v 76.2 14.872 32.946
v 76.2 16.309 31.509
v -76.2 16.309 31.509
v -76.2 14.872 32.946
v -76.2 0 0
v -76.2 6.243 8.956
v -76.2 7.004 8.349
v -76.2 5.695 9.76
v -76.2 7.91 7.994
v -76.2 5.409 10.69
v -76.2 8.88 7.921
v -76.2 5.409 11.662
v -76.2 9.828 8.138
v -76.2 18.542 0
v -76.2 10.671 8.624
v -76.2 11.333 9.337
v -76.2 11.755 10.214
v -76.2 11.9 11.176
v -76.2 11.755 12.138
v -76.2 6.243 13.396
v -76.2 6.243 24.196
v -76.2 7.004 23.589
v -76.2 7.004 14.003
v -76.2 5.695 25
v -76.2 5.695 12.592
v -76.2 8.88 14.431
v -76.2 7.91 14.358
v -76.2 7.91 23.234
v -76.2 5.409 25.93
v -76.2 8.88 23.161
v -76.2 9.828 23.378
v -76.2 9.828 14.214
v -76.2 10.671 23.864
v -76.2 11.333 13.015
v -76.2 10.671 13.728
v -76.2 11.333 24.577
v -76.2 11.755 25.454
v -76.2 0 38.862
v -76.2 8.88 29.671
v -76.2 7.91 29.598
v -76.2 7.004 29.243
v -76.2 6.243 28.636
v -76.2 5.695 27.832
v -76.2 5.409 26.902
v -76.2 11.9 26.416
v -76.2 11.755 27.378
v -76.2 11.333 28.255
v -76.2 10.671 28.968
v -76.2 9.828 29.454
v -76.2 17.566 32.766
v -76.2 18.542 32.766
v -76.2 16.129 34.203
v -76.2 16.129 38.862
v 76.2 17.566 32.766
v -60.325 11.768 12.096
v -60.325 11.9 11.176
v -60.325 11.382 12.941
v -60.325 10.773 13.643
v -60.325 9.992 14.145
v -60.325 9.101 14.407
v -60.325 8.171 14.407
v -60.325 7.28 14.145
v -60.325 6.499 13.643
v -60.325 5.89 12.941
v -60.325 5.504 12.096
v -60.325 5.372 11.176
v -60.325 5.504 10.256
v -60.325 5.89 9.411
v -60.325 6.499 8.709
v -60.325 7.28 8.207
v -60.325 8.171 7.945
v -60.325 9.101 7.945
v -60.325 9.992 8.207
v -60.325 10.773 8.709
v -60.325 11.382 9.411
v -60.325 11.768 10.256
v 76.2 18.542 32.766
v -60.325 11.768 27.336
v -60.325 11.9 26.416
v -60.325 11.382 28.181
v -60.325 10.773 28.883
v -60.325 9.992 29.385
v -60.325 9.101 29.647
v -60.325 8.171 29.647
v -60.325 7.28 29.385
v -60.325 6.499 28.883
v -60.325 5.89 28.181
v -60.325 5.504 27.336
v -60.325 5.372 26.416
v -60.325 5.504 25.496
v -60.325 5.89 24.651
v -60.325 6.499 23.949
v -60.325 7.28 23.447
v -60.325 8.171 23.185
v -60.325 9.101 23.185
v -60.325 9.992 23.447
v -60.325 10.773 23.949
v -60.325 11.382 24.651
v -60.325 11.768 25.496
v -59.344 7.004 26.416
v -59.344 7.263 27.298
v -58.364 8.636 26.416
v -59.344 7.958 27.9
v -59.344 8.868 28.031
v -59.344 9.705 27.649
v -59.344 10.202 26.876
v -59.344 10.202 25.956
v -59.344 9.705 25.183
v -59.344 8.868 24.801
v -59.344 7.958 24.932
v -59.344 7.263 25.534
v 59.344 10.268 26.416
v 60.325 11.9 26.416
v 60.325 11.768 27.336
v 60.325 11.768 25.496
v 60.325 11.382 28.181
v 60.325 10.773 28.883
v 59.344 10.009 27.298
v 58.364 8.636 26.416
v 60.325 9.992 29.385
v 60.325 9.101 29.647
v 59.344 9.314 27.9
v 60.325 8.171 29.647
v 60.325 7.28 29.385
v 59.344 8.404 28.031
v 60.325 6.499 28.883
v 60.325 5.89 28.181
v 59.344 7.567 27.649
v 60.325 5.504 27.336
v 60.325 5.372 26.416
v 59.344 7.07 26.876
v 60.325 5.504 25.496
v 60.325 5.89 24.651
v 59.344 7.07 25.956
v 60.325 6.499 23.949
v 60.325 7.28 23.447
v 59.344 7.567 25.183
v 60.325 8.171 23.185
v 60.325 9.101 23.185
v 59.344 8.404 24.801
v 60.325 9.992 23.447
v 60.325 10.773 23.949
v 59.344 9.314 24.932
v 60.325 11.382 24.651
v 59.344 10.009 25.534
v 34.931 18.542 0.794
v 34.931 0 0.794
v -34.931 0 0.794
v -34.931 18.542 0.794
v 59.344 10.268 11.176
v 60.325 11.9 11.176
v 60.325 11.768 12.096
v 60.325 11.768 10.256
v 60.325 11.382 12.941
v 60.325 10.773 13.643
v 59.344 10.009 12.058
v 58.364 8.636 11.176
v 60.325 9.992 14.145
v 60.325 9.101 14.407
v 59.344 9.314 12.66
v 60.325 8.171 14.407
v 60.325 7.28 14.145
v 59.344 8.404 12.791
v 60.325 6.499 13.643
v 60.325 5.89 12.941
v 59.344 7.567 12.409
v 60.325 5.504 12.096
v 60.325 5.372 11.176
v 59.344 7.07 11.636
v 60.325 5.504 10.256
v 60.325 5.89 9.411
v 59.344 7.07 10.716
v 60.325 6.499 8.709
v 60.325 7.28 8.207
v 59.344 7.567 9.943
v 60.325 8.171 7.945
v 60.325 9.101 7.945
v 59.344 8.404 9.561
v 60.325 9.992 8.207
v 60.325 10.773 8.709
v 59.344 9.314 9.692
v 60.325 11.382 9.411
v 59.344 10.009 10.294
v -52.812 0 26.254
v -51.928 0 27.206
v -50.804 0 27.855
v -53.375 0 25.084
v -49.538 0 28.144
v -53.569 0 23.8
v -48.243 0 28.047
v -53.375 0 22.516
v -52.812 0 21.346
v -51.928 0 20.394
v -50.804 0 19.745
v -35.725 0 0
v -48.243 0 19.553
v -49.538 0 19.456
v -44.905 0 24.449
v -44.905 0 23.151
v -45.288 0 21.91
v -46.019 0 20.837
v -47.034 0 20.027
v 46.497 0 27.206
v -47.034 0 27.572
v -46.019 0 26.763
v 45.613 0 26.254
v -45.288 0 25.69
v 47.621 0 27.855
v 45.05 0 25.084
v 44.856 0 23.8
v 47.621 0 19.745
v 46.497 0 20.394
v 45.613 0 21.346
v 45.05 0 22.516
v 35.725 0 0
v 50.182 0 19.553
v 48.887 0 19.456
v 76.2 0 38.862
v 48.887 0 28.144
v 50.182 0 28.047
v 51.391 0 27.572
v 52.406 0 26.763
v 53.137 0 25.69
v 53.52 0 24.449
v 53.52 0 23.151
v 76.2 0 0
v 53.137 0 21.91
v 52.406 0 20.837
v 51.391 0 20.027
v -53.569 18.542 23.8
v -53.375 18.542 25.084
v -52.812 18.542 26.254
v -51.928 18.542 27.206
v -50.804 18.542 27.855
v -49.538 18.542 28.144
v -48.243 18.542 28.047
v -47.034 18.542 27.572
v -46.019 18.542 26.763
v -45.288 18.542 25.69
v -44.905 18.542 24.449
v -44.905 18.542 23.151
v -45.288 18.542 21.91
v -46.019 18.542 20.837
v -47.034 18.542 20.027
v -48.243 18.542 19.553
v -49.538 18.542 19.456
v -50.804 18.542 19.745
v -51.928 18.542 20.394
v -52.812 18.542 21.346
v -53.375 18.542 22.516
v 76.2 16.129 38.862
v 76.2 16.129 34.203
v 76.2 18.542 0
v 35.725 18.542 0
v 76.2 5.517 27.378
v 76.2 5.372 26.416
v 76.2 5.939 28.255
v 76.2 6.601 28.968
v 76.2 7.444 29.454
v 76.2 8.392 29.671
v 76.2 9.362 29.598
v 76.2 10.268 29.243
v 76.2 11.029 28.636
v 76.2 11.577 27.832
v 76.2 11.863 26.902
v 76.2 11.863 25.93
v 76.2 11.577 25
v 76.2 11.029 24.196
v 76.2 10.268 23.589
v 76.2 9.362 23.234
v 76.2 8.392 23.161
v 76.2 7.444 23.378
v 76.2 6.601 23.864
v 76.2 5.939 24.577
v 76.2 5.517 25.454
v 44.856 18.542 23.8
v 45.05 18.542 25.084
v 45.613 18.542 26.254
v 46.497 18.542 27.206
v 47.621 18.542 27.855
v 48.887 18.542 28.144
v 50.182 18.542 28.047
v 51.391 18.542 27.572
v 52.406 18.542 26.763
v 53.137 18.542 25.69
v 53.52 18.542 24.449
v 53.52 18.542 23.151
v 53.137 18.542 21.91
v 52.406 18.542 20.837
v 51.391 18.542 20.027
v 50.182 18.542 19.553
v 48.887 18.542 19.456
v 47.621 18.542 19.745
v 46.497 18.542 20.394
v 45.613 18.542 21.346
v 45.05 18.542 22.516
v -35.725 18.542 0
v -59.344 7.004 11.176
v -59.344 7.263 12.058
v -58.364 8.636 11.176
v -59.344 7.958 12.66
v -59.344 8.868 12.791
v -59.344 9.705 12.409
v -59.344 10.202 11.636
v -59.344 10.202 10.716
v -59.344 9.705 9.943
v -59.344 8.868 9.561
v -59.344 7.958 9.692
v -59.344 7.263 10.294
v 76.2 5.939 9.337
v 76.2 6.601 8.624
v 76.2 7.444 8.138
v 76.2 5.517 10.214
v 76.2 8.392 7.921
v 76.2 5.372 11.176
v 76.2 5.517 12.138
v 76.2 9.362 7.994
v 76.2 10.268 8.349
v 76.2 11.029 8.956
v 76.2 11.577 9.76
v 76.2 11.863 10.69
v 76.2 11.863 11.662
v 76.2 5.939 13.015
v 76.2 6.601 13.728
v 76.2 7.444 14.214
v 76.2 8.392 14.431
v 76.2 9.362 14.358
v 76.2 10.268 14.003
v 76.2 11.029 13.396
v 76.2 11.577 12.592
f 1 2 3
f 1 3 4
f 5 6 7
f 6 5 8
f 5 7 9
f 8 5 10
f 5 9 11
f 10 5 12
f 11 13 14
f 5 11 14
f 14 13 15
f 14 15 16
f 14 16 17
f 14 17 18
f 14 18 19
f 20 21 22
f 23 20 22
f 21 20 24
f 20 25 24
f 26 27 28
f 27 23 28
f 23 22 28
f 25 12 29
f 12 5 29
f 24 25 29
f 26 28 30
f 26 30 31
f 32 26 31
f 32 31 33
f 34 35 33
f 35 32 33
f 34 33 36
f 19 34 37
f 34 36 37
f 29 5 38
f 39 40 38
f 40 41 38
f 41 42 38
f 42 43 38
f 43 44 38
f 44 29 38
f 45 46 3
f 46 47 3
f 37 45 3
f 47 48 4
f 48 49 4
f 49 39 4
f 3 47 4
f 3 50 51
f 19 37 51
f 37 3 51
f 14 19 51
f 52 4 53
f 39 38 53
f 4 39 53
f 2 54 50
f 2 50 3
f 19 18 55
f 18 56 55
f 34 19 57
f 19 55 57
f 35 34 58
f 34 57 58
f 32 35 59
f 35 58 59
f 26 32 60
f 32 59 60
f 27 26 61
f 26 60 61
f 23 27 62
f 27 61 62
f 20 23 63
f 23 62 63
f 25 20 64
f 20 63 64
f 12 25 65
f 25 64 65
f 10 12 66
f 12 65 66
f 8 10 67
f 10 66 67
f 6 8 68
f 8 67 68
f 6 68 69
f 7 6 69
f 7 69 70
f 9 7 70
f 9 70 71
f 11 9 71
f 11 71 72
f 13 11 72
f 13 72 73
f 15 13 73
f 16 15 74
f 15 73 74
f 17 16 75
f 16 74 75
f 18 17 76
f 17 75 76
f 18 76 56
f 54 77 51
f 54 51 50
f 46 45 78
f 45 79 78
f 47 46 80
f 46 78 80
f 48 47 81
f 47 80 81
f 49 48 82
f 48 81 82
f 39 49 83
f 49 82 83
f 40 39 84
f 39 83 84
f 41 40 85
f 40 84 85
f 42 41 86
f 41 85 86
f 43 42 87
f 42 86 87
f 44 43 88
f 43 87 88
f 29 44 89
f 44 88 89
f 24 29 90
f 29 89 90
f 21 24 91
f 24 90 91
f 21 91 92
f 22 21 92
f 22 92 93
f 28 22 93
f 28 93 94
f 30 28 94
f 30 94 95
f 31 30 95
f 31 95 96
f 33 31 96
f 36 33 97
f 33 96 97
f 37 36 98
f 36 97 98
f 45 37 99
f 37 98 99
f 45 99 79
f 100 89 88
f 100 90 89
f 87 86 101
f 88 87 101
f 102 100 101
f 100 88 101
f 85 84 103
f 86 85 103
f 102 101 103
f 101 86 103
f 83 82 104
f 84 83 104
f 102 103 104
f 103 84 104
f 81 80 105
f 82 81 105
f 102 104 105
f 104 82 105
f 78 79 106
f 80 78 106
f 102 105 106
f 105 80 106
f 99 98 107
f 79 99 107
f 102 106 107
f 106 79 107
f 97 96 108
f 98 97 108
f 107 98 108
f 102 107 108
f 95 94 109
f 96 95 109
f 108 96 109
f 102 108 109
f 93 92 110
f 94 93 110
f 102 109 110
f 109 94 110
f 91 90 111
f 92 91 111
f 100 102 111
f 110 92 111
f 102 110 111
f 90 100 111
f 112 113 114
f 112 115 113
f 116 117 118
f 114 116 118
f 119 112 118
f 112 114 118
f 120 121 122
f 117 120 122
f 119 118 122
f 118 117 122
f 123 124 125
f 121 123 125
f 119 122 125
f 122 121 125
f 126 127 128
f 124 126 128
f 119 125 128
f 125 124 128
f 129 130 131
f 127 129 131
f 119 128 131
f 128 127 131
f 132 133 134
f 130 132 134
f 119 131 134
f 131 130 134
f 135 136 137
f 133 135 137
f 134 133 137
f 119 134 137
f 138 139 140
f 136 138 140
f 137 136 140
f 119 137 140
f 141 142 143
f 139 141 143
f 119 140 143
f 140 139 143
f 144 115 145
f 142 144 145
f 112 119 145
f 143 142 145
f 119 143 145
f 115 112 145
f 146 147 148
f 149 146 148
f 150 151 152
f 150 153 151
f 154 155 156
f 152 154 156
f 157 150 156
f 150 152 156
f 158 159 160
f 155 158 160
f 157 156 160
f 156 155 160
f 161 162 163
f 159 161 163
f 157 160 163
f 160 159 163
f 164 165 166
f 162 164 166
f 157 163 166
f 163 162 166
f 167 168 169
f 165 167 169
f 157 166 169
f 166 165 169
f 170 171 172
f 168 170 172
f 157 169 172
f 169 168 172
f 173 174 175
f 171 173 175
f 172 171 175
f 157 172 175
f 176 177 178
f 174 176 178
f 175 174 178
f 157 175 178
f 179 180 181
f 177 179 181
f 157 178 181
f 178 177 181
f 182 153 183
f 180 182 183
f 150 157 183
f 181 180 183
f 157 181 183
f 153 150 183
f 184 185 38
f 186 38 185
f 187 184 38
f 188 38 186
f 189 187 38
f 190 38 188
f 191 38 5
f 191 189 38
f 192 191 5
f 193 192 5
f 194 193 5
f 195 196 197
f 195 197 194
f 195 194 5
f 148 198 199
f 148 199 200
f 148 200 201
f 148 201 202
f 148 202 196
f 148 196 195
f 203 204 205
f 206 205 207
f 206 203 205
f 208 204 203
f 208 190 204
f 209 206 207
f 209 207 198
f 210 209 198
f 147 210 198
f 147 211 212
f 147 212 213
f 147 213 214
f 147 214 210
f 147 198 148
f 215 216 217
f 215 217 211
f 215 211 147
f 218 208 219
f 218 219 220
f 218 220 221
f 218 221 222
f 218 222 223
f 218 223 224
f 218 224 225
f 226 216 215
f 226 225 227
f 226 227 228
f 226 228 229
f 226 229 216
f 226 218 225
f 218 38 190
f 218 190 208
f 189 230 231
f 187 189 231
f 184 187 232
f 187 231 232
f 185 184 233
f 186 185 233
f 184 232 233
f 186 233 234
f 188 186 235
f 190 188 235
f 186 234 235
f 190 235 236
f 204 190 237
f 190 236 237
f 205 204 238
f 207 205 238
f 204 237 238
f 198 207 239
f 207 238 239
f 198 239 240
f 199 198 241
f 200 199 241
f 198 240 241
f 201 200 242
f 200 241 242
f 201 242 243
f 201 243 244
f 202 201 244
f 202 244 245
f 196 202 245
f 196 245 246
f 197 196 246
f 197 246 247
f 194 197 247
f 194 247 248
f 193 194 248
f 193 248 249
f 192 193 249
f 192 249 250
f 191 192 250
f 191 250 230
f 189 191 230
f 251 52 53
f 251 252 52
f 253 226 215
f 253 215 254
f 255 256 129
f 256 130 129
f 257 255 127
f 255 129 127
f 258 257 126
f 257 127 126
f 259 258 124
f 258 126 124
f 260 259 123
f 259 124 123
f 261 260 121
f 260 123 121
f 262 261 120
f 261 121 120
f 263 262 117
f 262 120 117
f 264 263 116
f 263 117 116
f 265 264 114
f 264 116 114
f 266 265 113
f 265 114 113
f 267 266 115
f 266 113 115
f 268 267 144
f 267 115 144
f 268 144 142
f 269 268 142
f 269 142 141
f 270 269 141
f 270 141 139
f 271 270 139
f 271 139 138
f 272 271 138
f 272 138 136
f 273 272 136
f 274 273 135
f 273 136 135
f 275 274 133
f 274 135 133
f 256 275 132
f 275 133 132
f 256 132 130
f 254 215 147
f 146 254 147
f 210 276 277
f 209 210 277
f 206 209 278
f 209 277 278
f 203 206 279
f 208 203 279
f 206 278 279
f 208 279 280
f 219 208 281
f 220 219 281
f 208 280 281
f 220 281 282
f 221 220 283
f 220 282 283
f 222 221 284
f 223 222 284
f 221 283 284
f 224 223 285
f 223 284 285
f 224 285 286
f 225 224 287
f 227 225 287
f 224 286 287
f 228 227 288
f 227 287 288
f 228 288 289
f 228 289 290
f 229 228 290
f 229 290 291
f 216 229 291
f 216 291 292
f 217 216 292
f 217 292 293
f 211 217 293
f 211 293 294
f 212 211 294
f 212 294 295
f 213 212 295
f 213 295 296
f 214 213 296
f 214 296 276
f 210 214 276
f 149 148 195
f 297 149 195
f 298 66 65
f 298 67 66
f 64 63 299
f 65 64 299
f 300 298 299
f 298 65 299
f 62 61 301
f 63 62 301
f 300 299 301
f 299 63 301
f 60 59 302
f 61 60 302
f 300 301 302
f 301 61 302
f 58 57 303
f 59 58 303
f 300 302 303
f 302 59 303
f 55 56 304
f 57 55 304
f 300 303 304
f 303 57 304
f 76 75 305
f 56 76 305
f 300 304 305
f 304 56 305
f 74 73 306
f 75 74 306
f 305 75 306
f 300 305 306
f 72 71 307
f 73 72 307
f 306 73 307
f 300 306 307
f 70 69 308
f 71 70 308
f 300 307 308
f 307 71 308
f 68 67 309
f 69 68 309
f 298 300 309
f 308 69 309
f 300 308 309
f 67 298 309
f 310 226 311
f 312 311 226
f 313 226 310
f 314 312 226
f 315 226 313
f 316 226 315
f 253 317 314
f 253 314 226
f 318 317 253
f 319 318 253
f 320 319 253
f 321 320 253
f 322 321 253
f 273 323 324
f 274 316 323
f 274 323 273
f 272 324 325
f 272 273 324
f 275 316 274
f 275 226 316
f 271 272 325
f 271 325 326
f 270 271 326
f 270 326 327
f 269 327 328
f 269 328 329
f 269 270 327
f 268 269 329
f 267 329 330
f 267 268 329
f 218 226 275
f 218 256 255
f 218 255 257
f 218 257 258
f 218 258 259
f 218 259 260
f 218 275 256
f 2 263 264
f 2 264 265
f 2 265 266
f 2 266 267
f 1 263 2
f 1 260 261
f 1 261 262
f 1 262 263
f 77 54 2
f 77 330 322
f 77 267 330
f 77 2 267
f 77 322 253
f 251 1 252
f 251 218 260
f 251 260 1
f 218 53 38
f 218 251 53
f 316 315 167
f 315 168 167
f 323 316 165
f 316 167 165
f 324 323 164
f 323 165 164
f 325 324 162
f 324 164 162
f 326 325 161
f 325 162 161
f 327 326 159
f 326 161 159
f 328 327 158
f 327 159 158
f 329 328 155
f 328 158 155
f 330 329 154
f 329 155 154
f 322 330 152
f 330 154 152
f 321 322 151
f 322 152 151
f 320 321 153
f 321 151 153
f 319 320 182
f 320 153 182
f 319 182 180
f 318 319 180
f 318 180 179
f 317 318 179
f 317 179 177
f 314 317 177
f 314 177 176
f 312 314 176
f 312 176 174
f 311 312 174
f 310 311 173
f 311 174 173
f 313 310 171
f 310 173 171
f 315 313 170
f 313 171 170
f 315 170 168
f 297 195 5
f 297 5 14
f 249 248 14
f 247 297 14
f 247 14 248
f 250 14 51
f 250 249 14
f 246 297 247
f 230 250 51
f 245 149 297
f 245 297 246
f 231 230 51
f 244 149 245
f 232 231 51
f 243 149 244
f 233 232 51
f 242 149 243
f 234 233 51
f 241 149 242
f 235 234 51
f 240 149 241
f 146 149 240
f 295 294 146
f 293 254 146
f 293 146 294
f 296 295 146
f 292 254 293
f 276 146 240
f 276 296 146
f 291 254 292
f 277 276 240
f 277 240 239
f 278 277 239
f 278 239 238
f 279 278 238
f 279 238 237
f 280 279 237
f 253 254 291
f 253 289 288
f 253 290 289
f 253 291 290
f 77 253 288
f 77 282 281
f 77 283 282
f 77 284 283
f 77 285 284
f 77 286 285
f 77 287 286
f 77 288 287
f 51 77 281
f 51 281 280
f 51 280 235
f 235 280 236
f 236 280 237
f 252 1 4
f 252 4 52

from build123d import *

# Parameters (mm, degrees)
F1_DEPTH      = 76.2
F1_DEPTH_BACK = 76.2
F3_D          = 6.5278
F3_DEPTH      = 15.875
F3_TIP        = 1.9611489744
F5_D          = 6.5278
F5_DEPTH      = 15.875
F5_TIP        = 1.9611489744
F7_DEPTH      = 18.543
F8_R          = 4.3561
F9_DEPTH      = 18.543


with BuildPart() as f1:
    # F0 (on Right) → F1 (new body, two sides)
    with BuildSketch(Plane.YZ) as f1_sk:
        Polygon((0, 38.862), (0, 0), (18.542, 0), (18.542, 32.766), (17.5658409794, 32.766), (16.3086051224, 31.5087641431), (14.8717641431, 32.9456051224), (16.129, 34.2028409794), (16.129, 38.862), align=None)
    extrude(amount=F1_DEPTH)
    extrude(f1_sk.sketch, amount=-F1_DEPTH_BACK)

    # F3
    with Locations(Plane.YZ.offset(76.2)):
        with Locations((8.636, 11.176), (8.636, 26.416)):
            Hole(F3_D / 2, depth=F3_DEPTH)
            with Locations((0, 0, -(F3_DEPTH + F3_TIP / 2))):  # 118° drill point
                Cone(0, F3_D / 2, F3_TIP, mode=Mode.SUBTRACT)

    # F5
    with Locations(Plane(origin=(-76.2, 0, 0), x_dir=(0, -1, 0), z_dir=(-1, 0, 0))):
        with Locations((-8.636, 26.416), (-8.636, 11.176)):
            Hole(F5_D / 2, depth=F5_DEPTH)
            with Locations((0, 0, -(F5_DEPTH + F5_TIP / 2))):  # 118° drill point
                Cone(0, F5_D / 2, F5_TIP, mode=Mode.SUBTRACT)

    # F6 (on face) → F7 (cut, through all)
    with BuildSketch(Plane.XZ):
        Polygon((-34.93135, 0.79375), (-35.7251, 0), (35.7251, 0), (34.93135, 0.79375), align=None)
    extrude(amount=-F7_DEPTH, mode=Mode.SUBTRACT)

    # F8 (on face) → F9 (cut, through all)
    with BuildSketch(Plane(origin=(0, 18.542, 0), x_dir=(-1, 0, 0), z_dir=(0, 1, 0))):
        with Locations((-49.2125, 23.7998)):
            Circle(F8_R)
        with Locations((49.2125, 23.7998)):
            Circle(F8_R)
    extrude(amount=-F9_DEPTH, mode=Mode.SUBTRACT)


solid = f1.part
